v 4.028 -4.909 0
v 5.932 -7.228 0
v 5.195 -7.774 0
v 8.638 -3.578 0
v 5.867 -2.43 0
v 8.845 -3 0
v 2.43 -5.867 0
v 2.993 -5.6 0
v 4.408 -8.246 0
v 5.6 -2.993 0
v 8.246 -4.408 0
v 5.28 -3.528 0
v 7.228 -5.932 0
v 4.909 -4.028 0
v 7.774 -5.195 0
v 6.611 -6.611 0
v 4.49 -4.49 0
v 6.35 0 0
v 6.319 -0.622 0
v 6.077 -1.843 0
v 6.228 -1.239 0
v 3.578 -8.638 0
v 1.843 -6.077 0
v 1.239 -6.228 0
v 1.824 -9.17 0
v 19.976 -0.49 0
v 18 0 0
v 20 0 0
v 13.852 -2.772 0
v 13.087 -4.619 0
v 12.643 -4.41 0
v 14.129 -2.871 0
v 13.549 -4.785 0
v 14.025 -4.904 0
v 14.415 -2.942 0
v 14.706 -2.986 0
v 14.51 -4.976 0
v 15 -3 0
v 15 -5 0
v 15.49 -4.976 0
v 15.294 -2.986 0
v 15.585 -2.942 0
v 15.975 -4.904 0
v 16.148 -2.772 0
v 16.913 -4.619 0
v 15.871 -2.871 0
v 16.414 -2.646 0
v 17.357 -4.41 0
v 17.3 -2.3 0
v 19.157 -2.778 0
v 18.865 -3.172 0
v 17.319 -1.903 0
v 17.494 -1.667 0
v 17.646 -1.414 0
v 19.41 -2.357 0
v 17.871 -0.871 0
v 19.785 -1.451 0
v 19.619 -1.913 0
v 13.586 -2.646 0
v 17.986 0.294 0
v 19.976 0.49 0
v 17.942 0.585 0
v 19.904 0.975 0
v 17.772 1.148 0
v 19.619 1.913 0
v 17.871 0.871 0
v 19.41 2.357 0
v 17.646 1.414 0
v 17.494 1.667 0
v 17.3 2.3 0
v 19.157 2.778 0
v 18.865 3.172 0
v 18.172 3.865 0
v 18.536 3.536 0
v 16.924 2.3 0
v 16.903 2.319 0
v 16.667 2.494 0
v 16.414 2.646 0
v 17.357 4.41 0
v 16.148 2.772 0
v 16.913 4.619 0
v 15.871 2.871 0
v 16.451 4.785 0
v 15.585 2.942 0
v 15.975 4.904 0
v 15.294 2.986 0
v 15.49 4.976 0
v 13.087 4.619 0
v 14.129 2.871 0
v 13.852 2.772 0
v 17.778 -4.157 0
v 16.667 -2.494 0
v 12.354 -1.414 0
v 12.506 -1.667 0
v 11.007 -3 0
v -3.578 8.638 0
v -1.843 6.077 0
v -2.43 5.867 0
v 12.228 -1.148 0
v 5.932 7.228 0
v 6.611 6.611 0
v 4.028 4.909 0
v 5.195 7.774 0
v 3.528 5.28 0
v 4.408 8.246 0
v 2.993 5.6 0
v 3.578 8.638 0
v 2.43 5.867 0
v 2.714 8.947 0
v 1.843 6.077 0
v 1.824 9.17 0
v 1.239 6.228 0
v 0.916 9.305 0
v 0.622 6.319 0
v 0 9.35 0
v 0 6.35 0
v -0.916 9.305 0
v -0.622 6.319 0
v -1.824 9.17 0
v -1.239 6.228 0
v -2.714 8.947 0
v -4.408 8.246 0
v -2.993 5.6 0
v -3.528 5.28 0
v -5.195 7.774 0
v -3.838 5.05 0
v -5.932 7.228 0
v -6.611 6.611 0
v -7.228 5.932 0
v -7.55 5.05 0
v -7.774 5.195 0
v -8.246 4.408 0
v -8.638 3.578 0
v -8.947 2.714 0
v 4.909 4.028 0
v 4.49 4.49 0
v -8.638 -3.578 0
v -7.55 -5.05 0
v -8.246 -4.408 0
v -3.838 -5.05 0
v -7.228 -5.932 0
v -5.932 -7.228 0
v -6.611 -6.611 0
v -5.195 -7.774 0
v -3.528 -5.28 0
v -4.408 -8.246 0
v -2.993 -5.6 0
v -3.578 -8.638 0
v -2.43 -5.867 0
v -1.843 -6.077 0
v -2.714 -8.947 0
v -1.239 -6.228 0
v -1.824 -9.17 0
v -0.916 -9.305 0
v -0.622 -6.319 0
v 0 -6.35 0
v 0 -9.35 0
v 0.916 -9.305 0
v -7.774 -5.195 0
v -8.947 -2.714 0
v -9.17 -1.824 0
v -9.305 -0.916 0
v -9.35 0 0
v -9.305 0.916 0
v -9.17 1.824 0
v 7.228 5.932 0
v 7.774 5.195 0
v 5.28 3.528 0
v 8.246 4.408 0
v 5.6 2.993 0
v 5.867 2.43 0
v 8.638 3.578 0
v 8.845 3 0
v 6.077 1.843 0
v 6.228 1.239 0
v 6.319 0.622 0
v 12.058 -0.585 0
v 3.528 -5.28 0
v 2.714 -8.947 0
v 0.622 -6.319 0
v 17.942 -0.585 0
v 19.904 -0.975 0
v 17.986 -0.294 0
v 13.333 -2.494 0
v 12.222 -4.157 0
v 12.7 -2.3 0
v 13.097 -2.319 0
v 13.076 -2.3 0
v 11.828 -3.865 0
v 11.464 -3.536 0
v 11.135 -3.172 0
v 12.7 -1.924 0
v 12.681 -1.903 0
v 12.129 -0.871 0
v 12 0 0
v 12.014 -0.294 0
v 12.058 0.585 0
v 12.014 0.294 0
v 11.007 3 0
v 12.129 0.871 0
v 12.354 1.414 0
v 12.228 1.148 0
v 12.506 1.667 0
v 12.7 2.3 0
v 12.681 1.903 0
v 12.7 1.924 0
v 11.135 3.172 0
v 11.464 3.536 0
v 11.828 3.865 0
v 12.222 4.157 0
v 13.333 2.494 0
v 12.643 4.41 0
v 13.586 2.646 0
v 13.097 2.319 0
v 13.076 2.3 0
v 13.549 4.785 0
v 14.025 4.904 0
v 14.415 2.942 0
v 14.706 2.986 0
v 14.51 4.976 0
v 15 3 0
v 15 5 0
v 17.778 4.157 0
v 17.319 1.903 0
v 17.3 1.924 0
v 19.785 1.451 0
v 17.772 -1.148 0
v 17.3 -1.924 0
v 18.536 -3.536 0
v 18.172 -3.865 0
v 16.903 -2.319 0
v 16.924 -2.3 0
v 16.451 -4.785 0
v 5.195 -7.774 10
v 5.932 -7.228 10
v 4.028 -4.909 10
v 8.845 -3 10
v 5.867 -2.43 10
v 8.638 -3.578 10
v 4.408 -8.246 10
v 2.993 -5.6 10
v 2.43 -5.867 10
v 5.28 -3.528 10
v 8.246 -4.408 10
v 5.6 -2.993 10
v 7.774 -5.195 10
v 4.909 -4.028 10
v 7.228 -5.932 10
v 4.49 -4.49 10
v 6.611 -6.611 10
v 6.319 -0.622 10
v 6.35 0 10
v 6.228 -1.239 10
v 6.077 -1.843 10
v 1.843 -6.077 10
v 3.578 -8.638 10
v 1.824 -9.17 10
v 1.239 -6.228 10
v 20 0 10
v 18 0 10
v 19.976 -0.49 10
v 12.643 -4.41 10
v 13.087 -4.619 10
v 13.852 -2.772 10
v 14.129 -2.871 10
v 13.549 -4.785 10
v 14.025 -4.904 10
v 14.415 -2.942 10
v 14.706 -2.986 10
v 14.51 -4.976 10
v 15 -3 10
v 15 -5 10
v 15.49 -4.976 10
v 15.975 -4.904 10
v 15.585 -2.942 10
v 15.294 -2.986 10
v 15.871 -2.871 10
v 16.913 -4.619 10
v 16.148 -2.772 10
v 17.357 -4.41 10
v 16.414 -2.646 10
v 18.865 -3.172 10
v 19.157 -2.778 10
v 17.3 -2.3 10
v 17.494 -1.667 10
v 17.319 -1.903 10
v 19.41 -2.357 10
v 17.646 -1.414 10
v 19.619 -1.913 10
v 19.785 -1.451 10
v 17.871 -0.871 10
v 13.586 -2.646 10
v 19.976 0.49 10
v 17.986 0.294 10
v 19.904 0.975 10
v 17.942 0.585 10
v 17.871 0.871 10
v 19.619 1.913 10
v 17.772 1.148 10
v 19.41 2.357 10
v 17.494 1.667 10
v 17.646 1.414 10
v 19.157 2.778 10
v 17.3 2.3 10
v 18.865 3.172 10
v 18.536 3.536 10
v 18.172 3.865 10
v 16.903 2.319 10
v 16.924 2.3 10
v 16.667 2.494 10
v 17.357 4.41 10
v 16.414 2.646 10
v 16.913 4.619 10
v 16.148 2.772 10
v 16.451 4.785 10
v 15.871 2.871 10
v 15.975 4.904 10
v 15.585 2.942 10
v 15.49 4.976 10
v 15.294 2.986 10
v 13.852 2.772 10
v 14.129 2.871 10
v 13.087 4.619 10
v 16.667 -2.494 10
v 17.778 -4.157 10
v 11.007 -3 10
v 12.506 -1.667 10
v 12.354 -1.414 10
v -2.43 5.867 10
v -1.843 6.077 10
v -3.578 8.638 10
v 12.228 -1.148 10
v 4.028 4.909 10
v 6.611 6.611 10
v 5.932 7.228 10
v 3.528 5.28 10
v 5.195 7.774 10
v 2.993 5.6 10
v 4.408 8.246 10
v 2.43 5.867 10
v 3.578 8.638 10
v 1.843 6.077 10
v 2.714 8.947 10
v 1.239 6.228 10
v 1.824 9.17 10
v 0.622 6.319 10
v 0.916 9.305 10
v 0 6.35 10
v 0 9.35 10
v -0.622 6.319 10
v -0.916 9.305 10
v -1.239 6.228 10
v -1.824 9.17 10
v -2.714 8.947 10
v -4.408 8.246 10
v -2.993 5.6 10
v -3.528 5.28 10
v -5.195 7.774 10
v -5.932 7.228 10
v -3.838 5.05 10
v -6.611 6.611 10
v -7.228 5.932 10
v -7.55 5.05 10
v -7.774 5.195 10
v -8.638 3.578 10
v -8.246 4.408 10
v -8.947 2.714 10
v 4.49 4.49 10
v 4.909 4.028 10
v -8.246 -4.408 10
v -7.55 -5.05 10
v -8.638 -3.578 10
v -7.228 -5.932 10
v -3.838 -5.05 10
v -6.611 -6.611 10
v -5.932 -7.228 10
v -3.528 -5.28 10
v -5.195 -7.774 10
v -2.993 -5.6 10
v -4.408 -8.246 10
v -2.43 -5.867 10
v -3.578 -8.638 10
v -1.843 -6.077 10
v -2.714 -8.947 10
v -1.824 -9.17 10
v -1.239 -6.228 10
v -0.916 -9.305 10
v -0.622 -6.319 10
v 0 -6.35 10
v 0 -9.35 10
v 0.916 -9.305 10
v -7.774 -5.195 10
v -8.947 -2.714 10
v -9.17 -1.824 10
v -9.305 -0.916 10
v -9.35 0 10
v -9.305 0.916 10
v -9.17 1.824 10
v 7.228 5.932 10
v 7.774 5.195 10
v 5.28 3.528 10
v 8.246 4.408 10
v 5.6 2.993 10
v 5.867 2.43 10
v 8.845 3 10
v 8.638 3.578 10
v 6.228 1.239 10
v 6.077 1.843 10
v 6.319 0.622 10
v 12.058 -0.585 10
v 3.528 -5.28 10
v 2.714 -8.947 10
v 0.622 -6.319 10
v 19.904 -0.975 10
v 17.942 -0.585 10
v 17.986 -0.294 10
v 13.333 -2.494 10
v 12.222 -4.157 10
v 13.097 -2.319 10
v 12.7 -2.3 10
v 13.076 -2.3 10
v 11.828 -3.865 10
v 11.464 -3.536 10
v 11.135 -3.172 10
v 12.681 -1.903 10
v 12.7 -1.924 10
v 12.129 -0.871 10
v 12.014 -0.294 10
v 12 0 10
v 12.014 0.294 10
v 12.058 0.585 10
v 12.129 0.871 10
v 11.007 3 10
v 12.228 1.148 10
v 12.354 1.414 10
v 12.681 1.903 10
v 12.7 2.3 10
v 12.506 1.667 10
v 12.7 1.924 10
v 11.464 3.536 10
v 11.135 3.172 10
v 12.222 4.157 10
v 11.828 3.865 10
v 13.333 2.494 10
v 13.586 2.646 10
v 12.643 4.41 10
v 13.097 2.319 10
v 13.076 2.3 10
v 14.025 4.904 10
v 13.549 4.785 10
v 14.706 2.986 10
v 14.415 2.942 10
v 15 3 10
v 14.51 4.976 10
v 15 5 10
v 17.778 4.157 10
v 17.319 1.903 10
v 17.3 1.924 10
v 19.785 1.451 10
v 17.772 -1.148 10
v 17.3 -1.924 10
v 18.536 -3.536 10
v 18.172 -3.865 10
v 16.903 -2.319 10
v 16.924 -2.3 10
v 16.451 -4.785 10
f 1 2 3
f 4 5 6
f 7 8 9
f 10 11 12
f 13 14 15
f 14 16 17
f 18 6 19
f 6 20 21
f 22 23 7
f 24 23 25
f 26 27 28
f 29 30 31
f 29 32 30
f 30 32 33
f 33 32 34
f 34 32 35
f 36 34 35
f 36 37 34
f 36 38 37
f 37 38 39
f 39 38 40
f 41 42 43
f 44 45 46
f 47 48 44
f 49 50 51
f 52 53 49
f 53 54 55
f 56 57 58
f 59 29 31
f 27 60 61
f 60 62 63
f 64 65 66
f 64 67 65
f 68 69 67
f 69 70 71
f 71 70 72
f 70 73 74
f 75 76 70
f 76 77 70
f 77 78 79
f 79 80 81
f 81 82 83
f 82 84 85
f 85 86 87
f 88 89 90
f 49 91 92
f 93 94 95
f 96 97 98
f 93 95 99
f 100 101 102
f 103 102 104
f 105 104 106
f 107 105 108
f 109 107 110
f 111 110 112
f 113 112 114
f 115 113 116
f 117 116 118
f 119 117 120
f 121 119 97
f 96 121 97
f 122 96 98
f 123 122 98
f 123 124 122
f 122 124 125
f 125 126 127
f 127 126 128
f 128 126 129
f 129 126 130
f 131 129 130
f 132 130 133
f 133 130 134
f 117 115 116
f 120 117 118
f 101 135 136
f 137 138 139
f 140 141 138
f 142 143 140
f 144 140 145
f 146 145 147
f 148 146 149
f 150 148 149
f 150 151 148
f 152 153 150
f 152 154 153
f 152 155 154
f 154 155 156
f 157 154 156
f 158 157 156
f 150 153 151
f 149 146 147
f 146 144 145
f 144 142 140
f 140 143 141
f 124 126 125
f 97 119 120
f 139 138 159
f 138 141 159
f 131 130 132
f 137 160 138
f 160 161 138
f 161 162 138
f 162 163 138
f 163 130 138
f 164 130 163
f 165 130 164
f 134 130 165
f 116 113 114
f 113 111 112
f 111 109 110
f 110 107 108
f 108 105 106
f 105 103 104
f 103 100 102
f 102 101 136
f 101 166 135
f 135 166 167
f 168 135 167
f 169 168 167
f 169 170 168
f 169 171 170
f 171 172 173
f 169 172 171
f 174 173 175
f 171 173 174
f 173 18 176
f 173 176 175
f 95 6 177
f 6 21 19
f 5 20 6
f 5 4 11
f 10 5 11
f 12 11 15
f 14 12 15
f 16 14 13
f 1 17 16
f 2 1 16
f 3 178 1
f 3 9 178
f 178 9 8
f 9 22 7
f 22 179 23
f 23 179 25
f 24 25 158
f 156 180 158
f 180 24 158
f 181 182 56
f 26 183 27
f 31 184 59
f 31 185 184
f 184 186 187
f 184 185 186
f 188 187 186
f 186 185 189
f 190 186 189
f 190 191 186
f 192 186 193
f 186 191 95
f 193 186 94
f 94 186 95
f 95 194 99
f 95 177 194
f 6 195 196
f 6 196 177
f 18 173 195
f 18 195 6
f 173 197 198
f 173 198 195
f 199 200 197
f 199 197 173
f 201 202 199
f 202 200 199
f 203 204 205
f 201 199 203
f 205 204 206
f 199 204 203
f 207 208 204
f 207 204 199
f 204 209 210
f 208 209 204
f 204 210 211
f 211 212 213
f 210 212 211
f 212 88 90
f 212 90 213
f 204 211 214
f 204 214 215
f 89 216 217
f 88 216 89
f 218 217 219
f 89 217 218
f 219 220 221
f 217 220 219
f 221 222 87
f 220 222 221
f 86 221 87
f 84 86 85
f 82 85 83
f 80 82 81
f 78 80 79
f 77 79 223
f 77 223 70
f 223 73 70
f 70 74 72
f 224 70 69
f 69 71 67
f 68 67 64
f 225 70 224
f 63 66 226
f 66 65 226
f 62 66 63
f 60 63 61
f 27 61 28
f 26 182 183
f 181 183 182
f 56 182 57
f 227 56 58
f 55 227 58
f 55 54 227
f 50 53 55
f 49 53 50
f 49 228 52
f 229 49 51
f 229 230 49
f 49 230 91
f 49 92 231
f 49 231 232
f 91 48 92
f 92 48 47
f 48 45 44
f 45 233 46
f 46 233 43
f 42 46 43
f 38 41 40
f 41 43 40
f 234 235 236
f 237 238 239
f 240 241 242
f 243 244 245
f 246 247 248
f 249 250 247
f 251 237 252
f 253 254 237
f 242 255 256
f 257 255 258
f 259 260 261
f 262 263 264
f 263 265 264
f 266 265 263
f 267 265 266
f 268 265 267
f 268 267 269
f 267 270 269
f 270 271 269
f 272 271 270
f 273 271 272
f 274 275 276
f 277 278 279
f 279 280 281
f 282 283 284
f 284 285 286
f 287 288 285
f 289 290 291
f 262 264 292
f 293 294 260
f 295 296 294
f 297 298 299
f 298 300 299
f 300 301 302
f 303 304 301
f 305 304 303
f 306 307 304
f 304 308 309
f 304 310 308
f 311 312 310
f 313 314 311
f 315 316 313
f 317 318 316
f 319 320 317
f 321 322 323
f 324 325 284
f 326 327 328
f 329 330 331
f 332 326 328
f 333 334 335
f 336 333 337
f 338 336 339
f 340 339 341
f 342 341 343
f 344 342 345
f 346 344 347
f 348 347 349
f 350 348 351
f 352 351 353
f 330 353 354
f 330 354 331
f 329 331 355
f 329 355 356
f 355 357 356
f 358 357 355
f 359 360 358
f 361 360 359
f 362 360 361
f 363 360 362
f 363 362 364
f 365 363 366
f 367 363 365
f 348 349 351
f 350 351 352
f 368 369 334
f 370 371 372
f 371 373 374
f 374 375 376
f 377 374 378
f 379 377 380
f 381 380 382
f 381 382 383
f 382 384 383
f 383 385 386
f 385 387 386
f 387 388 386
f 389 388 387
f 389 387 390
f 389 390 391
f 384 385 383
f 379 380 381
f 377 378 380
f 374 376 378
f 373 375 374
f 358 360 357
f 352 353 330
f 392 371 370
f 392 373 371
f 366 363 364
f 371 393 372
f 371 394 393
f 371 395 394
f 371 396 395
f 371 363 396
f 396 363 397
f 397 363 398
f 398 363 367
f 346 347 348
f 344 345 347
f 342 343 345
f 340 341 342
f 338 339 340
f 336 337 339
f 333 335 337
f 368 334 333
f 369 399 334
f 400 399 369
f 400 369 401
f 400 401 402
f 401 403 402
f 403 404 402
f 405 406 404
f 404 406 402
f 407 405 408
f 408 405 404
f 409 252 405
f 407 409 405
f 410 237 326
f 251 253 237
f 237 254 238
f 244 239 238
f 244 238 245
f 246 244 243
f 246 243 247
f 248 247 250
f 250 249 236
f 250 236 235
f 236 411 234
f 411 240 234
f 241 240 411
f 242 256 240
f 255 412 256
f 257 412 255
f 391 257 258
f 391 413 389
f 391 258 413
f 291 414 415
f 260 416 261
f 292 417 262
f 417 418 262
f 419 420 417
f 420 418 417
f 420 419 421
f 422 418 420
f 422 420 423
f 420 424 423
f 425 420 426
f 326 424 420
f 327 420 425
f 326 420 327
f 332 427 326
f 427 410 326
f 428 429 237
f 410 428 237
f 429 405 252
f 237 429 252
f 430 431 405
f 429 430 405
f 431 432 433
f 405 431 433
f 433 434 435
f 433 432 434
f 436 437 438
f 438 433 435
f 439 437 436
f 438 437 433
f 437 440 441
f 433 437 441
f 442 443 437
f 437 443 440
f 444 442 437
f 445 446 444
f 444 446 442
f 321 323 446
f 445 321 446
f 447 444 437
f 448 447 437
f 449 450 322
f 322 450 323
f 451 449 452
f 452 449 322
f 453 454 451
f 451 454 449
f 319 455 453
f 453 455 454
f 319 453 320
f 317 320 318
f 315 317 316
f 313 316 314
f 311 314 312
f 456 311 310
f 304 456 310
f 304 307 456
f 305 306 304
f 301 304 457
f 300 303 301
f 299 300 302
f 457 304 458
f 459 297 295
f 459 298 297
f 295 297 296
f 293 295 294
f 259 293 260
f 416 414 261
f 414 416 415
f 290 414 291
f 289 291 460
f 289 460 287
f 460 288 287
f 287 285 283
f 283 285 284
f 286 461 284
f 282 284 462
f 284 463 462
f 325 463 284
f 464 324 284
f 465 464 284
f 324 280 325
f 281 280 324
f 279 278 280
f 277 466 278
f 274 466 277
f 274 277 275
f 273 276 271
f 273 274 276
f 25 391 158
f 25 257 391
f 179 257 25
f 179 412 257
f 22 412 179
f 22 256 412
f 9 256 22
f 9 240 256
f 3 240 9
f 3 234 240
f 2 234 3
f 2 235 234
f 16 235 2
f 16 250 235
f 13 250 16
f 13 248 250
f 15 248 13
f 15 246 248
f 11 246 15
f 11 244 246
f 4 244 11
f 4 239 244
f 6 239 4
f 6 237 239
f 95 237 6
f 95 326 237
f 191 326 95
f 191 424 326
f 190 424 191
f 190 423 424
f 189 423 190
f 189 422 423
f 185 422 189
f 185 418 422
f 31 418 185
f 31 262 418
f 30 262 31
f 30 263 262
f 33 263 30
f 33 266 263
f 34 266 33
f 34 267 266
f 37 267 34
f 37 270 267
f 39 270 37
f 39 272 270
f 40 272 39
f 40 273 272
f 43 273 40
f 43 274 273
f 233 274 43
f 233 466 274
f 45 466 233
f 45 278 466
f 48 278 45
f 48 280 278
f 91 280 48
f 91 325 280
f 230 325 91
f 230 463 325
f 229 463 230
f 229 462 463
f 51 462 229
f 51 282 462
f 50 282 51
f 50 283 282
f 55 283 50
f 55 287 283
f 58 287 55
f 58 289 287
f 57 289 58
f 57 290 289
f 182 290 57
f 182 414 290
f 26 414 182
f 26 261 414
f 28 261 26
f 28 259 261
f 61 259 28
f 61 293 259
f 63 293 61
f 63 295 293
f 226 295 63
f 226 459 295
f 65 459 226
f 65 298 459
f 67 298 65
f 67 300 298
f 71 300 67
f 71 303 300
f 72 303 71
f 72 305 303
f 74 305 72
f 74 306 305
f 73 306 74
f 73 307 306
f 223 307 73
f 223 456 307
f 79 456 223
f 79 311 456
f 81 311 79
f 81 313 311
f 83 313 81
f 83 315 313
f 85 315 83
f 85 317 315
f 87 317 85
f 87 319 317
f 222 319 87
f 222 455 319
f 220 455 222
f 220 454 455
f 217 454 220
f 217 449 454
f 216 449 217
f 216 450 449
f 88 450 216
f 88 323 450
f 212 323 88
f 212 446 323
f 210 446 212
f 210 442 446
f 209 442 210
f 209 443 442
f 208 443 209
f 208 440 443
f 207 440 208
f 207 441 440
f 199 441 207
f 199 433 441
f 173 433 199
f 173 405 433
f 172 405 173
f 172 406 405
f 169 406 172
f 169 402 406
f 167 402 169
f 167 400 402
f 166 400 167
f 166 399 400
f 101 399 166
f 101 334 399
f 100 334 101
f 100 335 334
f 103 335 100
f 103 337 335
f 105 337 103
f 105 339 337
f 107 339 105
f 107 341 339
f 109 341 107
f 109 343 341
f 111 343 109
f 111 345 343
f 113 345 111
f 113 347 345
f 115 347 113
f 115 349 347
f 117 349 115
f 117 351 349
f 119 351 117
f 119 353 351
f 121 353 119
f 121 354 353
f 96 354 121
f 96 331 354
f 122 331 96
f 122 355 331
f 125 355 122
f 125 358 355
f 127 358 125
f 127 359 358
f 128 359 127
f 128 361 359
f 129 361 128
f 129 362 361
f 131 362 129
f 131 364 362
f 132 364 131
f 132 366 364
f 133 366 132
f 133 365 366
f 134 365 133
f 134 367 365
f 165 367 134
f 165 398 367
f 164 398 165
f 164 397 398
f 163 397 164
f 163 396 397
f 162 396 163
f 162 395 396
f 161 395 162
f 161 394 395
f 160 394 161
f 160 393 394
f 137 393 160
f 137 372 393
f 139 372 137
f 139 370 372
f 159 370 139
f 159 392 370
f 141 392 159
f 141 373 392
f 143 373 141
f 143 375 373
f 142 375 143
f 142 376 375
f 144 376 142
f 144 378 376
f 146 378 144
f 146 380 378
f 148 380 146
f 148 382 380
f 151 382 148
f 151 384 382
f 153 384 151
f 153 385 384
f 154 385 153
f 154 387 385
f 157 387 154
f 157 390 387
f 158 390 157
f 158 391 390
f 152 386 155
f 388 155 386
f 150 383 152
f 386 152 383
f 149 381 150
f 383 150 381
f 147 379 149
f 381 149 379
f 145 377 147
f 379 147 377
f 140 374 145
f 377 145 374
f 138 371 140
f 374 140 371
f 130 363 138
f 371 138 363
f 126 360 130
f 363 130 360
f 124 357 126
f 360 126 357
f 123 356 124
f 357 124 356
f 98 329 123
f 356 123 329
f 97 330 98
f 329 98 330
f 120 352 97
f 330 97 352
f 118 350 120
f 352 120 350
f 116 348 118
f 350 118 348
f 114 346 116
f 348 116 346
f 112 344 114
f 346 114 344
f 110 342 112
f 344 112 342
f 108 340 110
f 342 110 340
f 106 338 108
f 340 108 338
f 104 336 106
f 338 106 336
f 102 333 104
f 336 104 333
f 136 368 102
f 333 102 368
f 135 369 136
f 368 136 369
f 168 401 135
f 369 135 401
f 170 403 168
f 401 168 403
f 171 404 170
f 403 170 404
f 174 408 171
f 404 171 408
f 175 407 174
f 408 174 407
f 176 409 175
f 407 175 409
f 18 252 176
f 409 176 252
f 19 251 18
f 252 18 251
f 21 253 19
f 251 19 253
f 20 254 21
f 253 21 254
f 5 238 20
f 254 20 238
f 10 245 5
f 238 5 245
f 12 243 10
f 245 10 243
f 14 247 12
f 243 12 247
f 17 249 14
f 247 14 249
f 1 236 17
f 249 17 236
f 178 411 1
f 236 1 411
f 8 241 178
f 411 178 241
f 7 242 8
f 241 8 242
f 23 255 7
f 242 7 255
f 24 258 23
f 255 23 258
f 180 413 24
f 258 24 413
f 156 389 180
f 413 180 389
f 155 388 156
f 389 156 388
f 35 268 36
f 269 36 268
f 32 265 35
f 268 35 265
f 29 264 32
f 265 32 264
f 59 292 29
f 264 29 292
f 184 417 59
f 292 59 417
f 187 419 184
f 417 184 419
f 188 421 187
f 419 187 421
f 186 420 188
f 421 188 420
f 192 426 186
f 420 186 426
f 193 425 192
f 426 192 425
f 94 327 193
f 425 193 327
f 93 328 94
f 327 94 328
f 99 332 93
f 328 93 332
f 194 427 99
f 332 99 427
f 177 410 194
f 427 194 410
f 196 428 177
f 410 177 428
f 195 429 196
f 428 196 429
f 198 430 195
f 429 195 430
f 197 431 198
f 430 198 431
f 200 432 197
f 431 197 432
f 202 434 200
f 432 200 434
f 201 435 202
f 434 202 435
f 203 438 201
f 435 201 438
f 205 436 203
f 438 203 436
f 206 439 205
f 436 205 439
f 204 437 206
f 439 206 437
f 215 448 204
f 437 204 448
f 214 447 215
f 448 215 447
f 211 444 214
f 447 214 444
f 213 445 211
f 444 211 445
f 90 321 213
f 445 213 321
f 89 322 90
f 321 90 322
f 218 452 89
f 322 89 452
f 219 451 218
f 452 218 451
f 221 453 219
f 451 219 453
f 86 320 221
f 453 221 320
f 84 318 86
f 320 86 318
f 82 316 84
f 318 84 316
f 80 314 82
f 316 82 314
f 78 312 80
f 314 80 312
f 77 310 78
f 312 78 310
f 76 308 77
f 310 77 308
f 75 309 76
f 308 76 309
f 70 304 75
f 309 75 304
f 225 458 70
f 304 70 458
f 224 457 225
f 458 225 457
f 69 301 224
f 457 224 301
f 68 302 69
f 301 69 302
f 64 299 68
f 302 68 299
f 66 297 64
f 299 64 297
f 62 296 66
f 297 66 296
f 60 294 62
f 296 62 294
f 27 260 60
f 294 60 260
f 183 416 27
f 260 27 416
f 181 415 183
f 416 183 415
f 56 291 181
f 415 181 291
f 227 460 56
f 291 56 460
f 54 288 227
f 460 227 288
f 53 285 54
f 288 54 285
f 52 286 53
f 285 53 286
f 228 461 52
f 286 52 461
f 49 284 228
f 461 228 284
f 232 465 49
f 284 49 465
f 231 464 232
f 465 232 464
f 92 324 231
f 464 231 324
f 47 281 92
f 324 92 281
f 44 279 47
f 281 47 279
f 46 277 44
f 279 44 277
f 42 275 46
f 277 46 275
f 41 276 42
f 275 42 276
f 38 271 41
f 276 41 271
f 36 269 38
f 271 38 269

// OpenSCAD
// --- Parameters (Dimensions in mm) ---

// Rod Ring (Inner diameter 12.7mm, Wall 3mm)
rod_inner_dia = 12.7;
rod_wall = 3.0;
rod_outer_dia = rod_inner_dia + (2 * rod_wall); // 18.7mm

// Rod Ring Cutout (10mm wide, 10mm tall, centered on -X side)
// Specification: "10 mm wide opening cut out of its -X side (everything with x < 0 and -5 < y < 5 is removed)"
// This means the cutout is the region: x in [-5, 0] and y in [-5, 5].
rod_cutout_x_min = -5.0;
rod_cutout_x_max = 0.0;
rod_cutout_y_min = -5.0;
rod_cutout_y_max = 5.0;

// Tubing Ring (Inner diameter 6mm, Wall 2mm)
tube_inner_dia = 6.0;
tube_wall = 2.0;
tube_outer_dia = tube_inner_dia + (2 * tube_wall); // 10.0mm
tube_offset_x = 15.0;

// Tubing Ring Cutout (4.5mm wide, centered on +X side)
// Specification: "4.5 mm wide opening cut out of its +X side (x > 15 and -2.25 < y < 2.25)"
// This means the cutout is the region: x in [15, 19.5] and y in [-2.25, 2.25].
tube_cutout_x_min = 15.0;
tube_cutout_x_max = 19.5;
tube_cutout_y_min = -2.25;
tube_cutout_y_max = 2.25;

// Bridge (6mm wide in Y, between x=8 and x=12)
bridge_x_start = 8.0;
bridge_x_end = 12.0;
bridge_y_width = 6.0;

// Extrusion Height
extrusion_z = 10.0;

// Resolution
$fn = 64;

// --- Modeling ---

module profile_2d() {
    difference() {
        union() {
            // 1. Rod Ring Profile
            difference() {
                circle(d = rod_outer_dia);
                circle(d = rod_inner_dia);
            }
            
            // 2. Tubing Ring Profile
            translate([tube_offset_x, 0])
            difference() {
                circle(d = tube_outer_dia);
                circle(d = tube_inner_dia);
            }
            
            // 3. Solid Bridge Profile
            // Spans from x=8 to x=12, centered on Y
            translate([(bridge_x_start + bridge_x_end)/2, 0])
                square([bridge_x_end - bridge_x_start, bridge_y_width], center = true);
        }

        // Subtract Rod Cutout: x < 0 and -5 < y < 5
        // The prompt specifies the region to be removed.
        // We use a rectangle that covers the specified range and extends slightly to ensure clean cut.
        // To ensure the hole is actually a hole in the ring, we must cut through the ring's geometry.
        // The ring exists from x = -9.35 to 9.35. 
        // The cutout is x in [-5, 0].
        translate([rod_cutout_x_min, 0])
            square([rod_cutout_x_max - rod_cutout_x_min + 0.1, rod_cutout_y_max - rod_cutout_y_min + 0.1], center = true);

        // Subtract Tubing Cutout: x > 15 and -2.25 < y < 2.25
        // The tube outer edge is at x = 20.
        // The cutout is x in [15, 19.5].
        translate([tube_cutout_x_min, 0])
            square([tube_cutout_x_max - tube_cutout_x_min + 0.1, tube_cutout_y_max - tube_cutout_y_min + 0.1], center = true);
    }
}

// Final 3D Object: Extrude the 2D profile
linear_extrude(height = extrusion_z) {
    profile_2d();
}
